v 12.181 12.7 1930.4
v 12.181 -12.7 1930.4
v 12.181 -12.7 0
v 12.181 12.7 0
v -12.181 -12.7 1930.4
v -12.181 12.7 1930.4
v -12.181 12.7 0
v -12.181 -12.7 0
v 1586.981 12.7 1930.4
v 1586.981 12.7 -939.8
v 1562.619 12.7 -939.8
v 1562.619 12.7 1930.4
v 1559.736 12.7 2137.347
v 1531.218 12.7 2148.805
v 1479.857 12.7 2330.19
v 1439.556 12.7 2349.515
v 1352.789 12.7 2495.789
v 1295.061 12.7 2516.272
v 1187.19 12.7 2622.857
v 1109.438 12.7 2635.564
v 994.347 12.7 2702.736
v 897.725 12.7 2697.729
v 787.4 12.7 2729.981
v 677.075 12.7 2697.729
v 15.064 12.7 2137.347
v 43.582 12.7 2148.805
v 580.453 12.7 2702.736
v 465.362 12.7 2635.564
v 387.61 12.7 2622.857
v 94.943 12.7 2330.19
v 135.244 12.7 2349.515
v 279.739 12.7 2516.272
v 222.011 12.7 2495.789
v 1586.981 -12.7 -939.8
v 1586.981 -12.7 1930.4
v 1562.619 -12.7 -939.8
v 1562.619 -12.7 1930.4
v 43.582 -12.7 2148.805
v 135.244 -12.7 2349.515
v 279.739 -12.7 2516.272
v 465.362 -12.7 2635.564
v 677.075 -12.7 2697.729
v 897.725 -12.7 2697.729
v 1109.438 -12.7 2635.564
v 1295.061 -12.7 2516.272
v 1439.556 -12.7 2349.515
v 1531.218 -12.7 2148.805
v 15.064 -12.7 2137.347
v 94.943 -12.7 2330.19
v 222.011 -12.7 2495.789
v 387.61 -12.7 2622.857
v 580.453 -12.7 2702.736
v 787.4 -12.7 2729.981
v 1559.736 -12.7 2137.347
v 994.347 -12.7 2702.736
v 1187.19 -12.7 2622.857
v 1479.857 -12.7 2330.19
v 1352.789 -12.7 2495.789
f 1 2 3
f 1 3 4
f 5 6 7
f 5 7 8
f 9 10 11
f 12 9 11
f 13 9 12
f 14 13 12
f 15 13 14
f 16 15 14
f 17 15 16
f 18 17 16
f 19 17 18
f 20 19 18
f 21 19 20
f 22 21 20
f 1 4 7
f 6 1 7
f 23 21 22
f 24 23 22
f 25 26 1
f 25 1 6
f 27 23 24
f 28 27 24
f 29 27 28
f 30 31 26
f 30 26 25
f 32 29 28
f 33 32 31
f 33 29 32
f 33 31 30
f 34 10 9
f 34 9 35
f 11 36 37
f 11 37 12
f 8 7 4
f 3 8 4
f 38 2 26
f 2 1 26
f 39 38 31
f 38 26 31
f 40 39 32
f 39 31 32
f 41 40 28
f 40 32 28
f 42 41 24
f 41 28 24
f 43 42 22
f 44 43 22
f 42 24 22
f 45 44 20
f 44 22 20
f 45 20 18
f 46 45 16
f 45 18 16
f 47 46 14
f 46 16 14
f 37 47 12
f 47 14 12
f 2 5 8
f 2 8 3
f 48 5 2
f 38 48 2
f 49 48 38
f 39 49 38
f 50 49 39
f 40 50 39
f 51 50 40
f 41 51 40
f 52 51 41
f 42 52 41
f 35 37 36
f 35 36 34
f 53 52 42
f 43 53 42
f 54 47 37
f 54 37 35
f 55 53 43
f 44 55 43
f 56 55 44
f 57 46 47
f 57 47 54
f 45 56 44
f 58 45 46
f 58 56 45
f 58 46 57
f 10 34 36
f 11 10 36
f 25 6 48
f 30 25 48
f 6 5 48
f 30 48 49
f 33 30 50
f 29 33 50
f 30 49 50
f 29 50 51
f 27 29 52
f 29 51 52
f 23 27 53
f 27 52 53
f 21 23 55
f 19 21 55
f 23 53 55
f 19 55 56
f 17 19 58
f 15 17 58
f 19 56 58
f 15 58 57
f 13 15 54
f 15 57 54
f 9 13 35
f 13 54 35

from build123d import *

# Parameters (mm, degrees)
F1_W = 24.3612935813
F1_H = 25.4


with BuildPart() as f2:
    # F2: sweep along a path in F0
    with BuildLine(Plane.XZ) as f2_path:
        Line((0, 0), (0, 1930.4))
        ThreePointArc((0, 1930.4), (787.4, 2717.8), (1574.8, 1930.4))
        Line((1574.8, 1930.4), (1574.8, -939.8))
    # F1 (on Top) → F2 (sweep)
    with BuildSketch(Plane.XY):
        Rectangle(F1_W, F1_H)
    sweep(path=f2_path.line)


solid = f2.part
